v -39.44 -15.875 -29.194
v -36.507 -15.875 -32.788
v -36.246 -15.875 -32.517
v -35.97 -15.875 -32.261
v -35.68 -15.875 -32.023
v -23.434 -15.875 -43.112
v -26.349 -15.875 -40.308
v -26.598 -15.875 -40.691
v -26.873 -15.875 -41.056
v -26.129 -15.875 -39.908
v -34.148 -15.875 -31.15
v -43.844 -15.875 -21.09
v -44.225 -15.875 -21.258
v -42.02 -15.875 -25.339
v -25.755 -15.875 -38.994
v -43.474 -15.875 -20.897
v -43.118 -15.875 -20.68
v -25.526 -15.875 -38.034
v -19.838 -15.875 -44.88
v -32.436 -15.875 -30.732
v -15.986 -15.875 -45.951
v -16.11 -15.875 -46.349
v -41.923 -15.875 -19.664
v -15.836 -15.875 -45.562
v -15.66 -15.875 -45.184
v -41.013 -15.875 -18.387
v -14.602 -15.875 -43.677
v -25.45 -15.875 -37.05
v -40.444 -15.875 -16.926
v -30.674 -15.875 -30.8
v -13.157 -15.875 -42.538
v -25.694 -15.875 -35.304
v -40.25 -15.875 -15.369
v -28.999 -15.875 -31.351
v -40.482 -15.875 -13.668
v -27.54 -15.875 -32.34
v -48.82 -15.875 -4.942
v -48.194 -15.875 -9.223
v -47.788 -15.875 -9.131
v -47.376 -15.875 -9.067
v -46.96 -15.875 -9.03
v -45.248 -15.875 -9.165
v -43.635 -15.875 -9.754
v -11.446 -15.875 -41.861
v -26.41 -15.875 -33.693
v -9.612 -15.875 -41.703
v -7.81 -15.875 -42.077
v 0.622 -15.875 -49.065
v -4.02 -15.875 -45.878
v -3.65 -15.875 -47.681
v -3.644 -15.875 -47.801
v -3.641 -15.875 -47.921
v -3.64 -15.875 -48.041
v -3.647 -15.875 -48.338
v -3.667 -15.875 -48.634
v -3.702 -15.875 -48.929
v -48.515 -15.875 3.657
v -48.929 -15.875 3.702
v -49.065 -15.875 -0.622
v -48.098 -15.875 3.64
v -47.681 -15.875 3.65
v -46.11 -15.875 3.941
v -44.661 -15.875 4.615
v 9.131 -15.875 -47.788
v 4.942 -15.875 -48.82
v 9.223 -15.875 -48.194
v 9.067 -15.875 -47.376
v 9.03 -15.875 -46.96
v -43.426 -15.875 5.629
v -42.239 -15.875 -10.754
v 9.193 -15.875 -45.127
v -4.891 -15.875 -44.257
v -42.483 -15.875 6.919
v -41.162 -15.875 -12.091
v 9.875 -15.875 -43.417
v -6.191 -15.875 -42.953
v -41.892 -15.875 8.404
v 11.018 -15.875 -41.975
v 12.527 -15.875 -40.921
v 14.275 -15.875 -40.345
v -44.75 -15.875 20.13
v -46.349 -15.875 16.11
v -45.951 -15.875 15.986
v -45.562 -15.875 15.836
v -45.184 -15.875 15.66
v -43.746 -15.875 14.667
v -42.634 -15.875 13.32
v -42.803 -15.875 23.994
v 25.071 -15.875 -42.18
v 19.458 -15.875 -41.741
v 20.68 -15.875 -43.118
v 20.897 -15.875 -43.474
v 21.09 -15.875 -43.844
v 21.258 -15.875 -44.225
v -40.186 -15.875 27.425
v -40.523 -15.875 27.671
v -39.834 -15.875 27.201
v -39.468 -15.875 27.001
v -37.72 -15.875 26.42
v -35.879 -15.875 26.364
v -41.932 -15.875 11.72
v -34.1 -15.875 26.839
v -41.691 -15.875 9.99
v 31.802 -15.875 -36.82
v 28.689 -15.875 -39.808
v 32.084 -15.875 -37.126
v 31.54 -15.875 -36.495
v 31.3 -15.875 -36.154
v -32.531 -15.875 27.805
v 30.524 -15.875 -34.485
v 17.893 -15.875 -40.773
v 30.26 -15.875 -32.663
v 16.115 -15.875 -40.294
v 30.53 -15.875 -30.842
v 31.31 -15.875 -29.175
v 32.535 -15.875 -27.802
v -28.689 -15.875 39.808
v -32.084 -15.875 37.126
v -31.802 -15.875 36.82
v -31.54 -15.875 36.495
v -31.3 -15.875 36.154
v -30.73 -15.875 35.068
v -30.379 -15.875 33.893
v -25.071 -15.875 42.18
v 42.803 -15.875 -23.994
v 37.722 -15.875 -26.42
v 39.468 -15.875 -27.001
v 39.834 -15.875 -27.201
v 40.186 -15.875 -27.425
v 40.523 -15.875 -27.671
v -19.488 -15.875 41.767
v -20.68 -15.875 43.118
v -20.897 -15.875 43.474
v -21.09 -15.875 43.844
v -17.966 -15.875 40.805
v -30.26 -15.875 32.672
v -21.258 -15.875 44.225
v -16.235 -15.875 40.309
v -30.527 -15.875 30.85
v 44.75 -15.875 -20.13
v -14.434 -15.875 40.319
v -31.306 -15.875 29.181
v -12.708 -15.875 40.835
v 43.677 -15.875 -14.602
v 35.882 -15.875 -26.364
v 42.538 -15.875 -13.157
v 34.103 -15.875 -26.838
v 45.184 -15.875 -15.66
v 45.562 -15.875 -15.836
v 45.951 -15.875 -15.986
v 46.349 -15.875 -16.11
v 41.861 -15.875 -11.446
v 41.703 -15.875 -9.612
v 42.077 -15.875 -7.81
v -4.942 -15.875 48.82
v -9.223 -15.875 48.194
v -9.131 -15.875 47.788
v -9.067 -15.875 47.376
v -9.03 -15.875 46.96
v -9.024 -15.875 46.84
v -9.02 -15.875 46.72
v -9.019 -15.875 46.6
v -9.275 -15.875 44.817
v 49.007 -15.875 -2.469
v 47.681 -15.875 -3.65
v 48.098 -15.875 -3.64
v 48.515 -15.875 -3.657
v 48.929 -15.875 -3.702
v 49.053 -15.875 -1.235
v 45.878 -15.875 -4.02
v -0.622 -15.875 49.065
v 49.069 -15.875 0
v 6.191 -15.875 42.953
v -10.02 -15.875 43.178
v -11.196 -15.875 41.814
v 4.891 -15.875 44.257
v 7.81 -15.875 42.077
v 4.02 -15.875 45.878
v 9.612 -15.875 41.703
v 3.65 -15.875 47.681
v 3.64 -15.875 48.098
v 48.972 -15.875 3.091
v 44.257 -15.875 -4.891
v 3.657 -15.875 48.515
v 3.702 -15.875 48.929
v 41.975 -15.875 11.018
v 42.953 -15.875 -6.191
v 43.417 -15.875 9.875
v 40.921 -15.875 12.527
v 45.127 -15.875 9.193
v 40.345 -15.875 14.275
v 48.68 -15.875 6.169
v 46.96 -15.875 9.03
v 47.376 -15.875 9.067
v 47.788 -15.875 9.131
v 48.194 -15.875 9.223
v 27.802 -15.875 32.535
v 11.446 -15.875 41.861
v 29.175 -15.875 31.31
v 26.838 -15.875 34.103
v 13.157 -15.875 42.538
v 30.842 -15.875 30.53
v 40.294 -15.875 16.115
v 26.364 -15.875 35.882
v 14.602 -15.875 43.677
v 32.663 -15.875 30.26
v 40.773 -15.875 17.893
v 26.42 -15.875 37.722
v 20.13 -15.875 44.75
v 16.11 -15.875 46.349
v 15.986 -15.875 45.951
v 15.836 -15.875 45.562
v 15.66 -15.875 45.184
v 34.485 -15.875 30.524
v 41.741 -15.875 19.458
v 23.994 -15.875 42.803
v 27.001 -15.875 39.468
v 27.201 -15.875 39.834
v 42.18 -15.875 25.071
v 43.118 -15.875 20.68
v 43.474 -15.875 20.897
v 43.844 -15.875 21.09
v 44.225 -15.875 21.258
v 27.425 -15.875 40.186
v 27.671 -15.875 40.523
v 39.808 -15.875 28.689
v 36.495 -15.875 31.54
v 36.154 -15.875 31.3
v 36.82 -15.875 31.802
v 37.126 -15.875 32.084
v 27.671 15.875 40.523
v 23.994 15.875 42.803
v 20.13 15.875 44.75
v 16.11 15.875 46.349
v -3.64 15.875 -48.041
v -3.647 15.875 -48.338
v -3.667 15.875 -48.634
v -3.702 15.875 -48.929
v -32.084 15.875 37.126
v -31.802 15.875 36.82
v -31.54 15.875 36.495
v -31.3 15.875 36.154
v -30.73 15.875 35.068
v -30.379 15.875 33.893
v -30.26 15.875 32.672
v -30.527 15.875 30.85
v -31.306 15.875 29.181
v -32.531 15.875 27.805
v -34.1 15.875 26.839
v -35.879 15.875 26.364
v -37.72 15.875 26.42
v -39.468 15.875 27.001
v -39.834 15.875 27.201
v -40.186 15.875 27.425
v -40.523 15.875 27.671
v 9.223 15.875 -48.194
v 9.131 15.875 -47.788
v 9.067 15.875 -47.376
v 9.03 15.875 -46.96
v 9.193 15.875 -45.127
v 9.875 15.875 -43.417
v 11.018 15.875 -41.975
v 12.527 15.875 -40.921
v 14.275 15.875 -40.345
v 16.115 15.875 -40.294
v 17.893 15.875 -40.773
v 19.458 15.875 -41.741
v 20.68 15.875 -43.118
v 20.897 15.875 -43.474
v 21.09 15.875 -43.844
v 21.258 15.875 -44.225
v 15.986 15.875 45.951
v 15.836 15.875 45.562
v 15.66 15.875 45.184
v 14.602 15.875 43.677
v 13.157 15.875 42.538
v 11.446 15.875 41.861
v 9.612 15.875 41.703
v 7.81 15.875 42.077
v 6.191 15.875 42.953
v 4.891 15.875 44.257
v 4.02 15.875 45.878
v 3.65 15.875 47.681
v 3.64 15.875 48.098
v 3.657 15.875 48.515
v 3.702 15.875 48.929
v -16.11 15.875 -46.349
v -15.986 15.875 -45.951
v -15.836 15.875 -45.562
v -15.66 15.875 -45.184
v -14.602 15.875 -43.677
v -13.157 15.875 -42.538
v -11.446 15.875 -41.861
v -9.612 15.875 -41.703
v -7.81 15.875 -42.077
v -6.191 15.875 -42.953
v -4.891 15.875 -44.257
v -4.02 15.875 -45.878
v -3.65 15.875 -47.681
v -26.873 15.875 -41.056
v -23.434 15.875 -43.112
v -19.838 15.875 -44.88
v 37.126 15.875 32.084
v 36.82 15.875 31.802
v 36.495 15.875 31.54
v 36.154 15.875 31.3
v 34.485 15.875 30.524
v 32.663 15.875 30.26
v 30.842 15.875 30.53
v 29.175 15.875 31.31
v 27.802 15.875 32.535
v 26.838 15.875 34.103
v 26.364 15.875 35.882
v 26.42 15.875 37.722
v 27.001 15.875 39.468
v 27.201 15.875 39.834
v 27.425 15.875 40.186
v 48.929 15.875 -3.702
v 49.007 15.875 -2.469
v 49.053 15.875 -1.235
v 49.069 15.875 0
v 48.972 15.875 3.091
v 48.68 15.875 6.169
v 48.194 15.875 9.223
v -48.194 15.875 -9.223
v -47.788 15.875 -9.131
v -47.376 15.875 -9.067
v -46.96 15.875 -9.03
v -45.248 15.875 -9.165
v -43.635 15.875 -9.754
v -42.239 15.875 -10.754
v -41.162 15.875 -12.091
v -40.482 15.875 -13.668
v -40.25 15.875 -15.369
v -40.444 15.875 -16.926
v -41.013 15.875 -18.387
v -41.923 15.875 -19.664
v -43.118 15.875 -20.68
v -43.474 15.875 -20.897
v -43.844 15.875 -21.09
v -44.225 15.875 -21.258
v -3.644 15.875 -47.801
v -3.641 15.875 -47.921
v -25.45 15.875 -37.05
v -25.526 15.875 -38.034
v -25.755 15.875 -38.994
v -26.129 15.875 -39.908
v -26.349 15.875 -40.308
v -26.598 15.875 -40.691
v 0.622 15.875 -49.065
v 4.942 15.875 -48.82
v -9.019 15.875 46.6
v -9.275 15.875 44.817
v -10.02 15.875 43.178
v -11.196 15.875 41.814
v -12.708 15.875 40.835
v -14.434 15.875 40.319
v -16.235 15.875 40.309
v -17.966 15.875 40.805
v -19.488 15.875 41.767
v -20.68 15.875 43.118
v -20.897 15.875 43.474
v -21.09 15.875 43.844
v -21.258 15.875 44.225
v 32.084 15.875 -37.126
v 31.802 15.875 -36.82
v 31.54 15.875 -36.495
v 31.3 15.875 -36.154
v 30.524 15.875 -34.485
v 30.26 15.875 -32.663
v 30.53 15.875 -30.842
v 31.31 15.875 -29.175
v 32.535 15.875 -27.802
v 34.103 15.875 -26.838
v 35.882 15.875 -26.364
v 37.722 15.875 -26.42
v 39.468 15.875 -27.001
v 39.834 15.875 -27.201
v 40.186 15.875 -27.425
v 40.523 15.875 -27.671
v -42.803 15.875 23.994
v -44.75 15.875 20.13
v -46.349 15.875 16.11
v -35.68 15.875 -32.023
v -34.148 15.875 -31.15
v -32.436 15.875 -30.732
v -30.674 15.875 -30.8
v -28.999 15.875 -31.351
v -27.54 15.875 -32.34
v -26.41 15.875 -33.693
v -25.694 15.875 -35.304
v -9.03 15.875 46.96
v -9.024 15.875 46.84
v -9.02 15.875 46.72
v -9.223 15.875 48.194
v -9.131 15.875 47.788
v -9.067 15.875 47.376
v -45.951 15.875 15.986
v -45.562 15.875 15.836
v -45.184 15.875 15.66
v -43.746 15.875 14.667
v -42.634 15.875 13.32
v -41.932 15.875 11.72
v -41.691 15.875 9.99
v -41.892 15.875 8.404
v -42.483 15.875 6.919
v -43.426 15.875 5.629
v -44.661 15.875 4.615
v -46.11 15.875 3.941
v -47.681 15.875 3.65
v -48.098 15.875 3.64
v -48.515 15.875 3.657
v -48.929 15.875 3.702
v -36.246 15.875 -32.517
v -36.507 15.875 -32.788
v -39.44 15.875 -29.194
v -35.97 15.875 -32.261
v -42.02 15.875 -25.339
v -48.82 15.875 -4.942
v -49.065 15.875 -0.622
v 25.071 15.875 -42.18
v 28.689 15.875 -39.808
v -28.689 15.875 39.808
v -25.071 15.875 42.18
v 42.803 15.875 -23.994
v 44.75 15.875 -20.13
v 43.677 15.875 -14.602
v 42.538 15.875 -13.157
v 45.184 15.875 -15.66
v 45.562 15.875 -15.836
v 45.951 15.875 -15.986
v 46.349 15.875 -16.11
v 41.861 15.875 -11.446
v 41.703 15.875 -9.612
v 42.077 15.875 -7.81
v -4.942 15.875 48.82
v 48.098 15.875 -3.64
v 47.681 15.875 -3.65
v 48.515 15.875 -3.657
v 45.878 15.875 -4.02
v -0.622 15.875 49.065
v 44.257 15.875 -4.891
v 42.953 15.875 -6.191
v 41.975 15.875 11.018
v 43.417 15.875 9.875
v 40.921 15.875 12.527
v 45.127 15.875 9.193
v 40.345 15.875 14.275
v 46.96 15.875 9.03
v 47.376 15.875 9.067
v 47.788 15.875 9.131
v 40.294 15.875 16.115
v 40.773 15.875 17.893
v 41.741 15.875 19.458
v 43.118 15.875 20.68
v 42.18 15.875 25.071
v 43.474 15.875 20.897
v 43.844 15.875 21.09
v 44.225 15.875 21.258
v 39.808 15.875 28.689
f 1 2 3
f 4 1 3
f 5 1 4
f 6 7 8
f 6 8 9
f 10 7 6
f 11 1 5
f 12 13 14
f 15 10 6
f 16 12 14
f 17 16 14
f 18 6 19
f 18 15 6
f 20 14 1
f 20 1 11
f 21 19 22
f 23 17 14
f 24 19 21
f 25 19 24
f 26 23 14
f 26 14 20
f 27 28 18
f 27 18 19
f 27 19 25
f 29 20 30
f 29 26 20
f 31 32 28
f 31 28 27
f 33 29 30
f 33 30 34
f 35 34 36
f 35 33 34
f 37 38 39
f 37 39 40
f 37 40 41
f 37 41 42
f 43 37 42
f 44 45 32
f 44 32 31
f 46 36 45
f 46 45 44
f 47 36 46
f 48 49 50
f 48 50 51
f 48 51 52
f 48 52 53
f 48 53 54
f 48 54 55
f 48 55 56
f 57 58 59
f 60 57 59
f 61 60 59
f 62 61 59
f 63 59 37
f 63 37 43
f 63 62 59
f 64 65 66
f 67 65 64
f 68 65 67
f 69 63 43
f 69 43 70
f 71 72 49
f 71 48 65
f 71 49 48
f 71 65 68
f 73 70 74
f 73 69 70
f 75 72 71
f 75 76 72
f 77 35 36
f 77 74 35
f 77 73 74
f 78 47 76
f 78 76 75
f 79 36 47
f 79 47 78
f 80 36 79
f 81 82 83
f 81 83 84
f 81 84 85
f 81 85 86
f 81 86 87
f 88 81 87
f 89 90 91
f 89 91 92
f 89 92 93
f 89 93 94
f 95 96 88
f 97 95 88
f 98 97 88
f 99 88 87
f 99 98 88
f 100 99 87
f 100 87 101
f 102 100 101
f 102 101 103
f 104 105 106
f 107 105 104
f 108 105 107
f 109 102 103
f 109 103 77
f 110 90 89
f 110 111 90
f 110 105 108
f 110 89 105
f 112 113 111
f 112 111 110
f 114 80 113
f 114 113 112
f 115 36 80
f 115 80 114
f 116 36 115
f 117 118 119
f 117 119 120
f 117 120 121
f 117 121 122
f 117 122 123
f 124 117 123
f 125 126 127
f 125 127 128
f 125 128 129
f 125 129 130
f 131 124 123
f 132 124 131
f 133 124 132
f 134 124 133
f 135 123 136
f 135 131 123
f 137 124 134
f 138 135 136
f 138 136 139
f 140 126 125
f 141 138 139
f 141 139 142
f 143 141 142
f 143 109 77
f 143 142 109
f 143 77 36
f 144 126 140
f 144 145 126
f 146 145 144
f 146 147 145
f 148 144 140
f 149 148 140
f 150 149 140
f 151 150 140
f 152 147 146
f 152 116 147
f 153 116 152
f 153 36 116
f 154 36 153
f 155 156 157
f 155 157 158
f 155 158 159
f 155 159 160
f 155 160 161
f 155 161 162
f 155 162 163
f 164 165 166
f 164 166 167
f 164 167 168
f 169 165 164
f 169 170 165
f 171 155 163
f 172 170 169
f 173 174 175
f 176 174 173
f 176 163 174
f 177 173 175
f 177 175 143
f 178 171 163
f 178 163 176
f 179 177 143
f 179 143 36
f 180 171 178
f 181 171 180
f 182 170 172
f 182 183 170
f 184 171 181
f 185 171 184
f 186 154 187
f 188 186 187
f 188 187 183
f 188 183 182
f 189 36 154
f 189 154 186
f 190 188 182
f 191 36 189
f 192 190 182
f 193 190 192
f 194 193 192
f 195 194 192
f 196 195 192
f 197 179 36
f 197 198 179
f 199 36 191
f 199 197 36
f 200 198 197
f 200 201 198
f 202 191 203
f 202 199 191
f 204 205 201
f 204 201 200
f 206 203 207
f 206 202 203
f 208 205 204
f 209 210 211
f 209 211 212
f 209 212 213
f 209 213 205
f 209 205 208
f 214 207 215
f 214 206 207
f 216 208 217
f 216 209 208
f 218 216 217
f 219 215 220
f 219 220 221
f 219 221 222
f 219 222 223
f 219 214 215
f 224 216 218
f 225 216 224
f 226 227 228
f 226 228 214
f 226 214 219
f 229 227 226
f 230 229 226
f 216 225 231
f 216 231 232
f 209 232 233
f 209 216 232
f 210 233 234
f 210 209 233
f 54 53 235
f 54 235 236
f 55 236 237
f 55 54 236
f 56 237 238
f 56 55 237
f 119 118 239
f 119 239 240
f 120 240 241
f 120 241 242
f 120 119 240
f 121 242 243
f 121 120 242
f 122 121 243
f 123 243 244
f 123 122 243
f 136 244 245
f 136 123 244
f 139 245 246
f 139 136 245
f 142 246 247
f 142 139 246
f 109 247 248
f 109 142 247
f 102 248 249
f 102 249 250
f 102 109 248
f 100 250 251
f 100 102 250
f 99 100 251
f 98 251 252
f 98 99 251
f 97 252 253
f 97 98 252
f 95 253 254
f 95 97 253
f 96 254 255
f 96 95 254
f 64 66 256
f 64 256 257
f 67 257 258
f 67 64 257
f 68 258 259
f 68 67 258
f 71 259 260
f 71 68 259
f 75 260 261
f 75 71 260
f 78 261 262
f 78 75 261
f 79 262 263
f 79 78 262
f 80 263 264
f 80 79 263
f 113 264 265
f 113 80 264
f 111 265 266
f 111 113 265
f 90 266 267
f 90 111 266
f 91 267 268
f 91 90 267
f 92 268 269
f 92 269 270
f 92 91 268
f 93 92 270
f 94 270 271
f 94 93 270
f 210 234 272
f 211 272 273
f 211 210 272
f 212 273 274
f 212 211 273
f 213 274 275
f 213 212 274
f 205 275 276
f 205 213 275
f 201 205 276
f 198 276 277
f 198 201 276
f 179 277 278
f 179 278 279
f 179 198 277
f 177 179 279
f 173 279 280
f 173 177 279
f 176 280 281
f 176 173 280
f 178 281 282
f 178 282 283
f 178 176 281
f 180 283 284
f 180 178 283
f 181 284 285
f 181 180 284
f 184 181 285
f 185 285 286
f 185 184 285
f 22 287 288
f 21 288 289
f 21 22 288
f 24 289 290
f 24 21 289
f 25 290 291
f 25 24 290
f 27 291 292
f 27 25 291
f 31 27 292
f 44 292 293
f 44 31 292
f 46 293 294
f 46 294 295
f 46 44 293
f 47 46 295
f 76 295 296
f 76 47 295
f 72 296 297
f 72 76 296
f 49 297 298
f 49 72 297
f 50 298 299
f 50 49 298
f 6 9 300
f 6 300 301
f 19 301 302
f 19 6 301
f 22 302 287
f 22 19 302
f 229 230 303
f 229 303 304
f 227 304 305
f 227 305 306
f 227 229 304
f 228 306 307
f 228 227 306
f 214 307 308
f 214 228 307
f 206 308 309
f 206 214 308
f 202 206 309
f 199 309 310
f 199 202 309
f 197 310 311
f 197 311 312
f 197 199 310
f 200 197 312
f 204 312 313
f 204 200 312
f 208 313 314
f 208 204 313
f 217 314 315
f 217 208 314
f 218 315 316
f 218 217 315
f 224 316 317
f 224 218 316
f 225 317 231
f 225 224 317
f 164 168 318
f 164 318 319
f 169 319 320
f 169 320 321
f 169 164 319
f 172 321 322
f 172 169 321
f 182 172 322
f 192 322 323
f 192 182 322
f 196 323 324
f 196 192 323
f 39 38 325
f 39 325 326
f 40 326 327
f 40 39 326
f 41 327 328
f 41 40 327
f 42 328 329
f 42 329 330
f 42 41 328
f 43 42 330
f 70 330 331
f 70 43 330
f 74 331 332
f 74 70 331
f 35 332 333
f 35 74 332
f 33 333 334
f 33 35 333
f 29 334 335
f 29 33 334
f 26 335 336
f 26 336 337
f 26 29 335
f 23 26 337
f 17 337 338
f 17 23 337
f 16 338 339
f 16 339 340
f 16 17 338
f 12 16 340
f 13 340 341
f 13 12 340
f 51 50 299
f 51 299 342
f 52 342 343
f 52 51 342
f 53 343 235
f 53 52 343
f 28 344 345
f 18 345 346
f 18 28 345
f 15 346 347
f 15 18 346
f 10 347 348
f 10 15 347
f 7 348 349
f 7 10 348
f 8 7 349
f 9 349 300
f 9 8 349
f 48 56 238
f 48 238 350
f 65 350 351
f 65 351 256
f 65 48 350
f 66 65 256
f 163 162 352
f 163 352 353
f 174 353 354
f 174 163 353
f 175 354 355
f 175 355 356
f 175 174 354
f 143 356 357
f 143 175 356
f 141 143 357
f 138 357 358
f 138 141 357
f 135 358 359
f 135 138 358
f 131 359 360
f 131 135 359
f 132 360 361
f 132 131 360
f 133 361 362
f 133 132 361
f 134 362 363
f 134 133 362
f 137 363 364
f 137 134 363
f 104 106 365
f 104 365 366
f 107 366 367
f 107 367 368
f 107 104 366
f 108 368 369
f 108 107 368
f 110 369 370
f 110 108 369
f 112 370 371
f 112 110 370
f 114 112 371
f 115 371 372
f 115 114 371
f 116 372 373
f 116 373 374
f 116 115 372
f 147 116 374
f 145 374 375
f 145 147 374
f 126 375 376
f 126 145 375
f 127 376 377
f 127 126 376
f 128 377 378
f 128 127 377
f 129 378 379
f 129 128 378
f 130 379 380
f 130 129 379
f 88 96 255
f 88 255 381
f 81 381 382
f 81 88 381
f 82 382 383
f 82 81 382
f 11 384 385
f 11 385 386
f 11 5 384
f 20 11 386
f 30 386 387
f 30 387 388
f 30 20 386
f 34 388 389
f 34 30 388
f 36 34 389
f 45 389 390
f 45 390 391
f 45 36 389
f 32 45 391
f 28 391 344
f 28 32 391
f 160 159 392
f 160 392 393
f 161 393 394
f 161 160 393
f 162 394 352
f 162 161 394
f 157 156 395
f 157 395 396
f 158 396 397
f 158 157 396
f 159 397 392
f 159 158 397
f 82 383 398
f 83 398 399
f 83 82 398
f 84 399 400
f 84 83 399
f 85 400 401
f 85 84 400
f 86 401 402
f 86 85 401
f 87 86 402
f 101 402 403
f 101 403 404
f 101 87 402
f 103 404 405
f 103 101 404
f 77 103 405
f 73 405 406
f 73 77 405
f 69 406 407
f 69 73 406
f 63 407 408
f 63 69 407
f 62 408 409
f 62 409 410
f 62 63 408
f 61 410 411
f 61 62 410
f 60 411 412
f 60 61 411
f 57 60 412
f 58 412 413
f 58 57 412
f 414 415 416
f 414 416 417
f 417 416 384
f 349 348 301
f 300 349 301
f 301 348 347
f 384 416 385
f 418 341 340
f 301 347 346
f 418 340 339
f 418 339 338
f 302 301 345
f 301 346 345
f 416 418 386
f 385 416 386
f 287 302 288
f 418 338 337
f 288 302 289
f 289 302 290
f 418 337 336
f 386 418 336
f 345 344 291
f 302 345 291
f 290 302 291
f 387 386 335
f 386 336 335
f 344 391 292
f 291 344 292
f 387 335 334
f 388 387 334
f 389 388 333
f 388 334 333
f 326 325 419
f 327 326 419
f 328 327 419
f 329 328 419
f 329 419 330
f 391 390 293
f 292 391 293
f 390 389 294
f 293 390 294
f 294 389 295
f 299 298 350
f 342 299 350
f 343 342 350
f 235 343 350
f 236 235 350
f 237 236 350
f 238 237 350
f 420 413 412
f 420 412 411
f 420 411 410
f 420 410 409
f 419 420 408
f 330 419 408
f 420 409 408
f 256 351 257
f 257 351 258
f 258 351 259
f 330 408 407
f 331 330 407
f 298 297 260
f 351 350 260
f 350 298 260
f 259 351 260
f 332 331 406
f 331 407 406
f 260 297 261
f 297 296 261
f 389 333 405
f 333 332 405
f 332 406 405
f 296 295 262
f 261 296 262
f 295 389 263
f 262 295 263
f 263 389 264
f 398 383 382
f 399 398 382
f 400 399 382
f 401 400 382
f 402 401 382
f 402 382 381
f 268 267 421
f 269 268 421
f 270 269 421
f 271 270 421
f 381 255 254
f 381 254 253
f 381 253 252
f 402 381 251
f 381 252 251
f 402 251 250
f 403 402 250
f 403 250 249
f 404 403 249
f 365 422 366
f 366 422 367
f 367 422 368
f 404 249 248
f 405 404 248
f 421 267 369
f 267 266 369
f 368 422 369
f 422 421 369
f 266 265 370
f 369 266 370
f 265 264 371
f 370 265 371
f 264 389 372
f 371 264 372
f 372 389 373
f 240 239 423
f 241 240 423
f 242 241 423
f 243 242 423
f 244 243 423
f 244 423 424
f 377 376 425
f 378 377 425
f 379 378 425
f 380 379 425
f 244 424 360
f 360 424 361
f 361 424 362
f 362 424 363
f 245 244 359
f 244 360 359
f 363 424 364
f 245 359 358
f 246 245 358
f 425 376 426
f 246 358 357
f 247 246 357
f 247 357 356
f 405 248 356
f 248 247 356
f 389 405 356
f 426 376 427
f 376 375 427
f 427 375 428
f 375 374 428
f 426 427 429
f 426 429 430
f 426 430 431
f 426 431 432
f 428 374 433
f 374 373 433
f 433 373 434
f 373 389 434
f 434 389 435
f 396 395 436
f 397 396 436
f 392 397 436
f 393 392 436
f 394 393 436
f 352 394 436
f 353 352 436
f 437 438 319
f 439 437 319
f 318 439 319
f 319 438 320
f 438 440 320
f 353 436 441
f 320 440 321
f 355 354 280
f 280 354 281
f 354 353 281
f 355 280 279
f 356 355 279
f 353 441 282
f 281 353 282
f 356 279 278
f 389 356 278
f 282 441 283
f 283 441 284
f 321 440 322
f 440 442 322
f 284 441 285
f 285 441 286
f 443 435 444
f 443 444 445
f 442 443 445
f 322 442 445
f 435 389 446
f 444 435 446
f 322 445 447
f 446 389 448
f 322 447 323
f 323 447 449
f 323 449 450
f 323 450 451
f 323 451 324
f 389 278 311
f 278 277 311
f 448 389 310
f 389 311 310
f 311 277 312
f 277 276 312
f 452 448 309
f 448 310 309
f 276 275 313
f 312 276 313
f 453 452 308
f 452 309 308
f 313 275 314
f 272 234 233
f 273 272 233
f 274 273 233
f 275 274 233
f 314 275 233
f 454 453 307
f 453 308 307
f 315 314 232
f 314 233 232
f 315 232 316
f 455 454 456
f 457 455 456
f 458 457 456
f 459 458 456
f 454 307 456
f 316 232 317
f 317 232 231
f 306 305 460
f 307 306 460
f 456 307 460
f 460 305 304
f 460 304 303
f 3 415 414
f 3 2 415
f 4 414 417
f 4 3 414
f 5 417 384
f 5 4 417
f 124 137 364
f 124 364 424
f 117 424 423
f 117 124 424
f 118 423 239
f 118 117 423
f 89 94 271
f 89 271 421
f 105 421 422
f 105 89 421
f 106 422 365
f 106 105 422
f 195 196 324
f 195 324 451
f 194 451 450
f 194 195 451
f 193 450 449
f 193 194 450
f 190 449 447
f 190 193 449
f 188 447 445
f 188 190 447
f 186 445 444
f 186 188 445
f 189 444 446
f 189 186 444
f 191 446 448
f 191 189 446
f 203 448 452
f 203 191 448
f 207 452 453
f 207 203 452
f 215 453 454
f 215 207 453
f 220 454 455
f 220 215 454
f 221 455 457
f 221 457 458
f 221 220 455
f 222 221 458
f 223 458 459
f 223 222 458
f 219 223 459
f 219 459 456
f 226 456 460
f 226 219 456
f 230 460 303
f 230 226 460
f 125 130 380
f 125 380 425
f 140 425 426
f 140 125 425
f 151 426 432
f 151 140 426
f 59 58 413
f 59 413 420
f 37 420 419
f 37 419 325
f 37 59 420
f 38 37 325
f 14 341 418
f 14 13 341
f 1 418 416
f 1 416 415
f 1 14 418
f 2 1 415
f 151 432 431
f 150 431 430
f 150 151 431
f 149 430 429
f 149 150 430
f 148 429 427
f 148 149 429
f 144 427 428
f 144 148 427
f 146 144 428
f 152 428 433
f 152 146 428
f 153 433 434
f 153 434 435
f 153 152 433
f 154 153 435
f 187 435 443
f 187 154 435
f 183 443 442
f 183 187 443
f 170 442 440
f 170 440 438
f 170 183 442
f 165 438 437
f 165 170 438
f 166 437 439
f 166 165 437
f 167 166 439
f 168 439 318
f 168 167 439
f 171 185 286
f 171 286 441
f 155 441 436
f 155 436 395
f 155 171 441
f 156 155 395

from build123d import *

# Parameters (mm, degrees)
F1_DEPTH = 15.875


with BuildPart() as f1:
    # F0 (on Front) → F1 (new body, symmetric)
    with BuildSketch(Plane.XZ):
        with BuildLine():
            Line((-43.1179597079, -20.6795539033), (-35.6798299226, -32.0231574202))
            ThreePointArc((-35.6798299226, -32.0231574202), (-28.999387078, -31.3506516016), (-25.4497350562, -37.0498226993))
            ThreePointArc((-25.4497350562, -37.0498226993), (-25.6219242672, -38.5185479478), (-26.1291535934, -39.9076200809))
            Line((-26.1291535934, -39.9076200809), (-15.6603085893, -45.1835936364))
            ThreePointArc((-15.6603085893, -45.1835936364), (-8.6969613087, -41.8243775437), (-3.6499608348, -47.681025418))
            Line((-3.6499608348, -47.681025418), (9.0295717487, -46.960294218))
            ThreePointArc((9.0295717487, -46.960294218), (13.3803993428, -40.5694541047), (20.6795539033, -43.1179597079))
            Line((20.6795539033, -43.1179597079), (31.2999856287, -36.1540218876))
            ThreePointArc((31.2999856287, -36.1540218876), (31.872492796, -28.4439782009), (39.4679988731, -27.0014715148))
            Line((39.4679988731, -27.0014715148), (45.1835936364, -15.6603085893))
            ThreePointArc((45.1835936364, -15.6603085893), (41.8243775437, -8.6969613087), (47.681025418, -3.6499608348))
            Line((47.681025418, -3.6499608348), (46.960294218, 9.0295717487))
            ThreePointArc((46.960294218, 9.0295717487), (40.5694541047, 13.3803993428), (43.1179597079, 20.6795539033))
            Line((43.1179597079, 20.6795539033), (36.1540218876, 31.2999856287))
            ThreePointArc((36.1540218876, 31.2999856287), (28.4439782009, 31.872492796), (27.0014715148, 39.4679988731))
            Line((27.0014715148, 39.4679988731), (15.6603085893, 45.1835936364))
            ThreePointArc((15.6603085893, 45.1835936364), (8.6969613087, 41.8243775437), (3.6499608348, 47.681025418))
            Line((3.6499608348, 47.681025418), (-9.0295717487, 46.960294218))
            ThreePointArc((-9.0295717487, 46.960294218), (-9.0218969832, 46.7801840579), (-9.0193380405, 46.599928618))
            ThreePointArc((-9.0193380405, 46.599928618), (-13.5523860225, 40.5154249107), (-20.6795539033, 43.1179597079))
            Line((-20.6795539033, 43.1179597079), (-31.2999856287, 36.1540218876))
            ThreePointArc((-31.2999856287, 36.1540218876), (-30.5256977842, 34.4890049955), (-30.2602014915, 32.6720529775))
            ThreePointArc((-30.2602014915, 32.6720529775), (-33.2803751727, 27.2651354928), (-39.4679988731, 27.0014715148))
            Line((-39.4679988731, 27.0014715148), (-45.1835936364, 15.6603085893))
            ThreePointArc((-45.1835936364, 15.6603085893), (-42.6344735333, 13.3195534454), (-41.691391018, 9.9897271266))
            ThreePointArc((-41.691391018, 9.9897271266), (-43.4256125593, 5.6288683556), (-47.681025418, 3.6499608348))
            Line((-47.681025418, 3.6499608348), (-46.960294218, -9.0295717487))
            ThreePointArc((-46.960294218, -9.0295717487), (-42.2390698471, -10.7535595818), (-40.249928618, -15.3693380405))
            ThreePointArc((-40.249928618, -15.3693380405), (-41.0127556934, -18.3869527791), (-43.1179597079, -20.6795539033))
        make_face()
        with BuildLine():
            ThreePointArc((-40.5228638212, 27.6706958124), (-43.8188886794, 22.0833623778), (-46.3490638812, 16.1100644426))
            ThreePointArc((-46.3490638812, 16.1100644426), (-45.7552417742, 15.9139166606), (-45.1835936364, 15.6603085893))
            Line((-45.1835936364, 15.6603085893), (-39.4679988731, 27.0014715148))
            ThreePointArc((-39.4679988731, 27.0014715148), (-40.0119284743, 27.3100800632), (-40.5228638212, 27.6706958124))
        make_face()
        with BuildLine():
            ThreePointArc((-21.2584815971, 44.2249574245), (-26.9065895731, 41.0341971599), (-32.0844345415, 37.1262570045))
            ThreePointArc((-32.0844345415, 37.1262570045), (-31.6682434024, 36.6594769889), (-31.2999856287, 36.1540218876))
            Line((-31.2999856287, 36.1540218876), (-20.6795539033, 43.1179597079))
            ThreePointArc((-20.6795539033, 43.1179597079), (-20.9963064816, 43.6571873513), (-21.2584815971, 44.2249574245))
        make_face()
        with BuildLine():
            ThreePointArc((3.7020936033, 48.9291774094), (-2.7846915195, 48.9899519509), (-9.2228068767, 48.1944989841))
            ThreePointArc((-9.2228068767, 48.1944989841), (-9.0957647853, 47.582160063), (-9.0295717487, 46.960294218))
            Line((-9.0295717487, 46.960294218), (3.6499608348, 47.681025418))
            ThreePointArc((3.6499608348, 47.681025418), (3.6452588769, 48.3063865448), (3.7020936033, 48.9291774094))
        make_face()
        with BuildLine():
            ThreePointArc((16.1100644426, 46.3490638812), (15.9139166606, 45.7552417742), (15.6603085893, 45.1835936364))
            Line((15.6603085893, 45.1835936364), (27.0014715148, 39.4679988731))
            ThreePointArc((27.0014715148, 39.4679988731), (27.3100800632, 40.0119284743), (27.6706958124, 40.5228638212))
            ThreePointArc((27.6706958124, 40.5228638212), (22.0833623778, 43.8188886794), (16.1100644426, 46.3490638812))
        make_face()
        with BuildLine():
            Line((36.1540218876, 31.2999856287), (43.1179597079, 20.6795539033))
            ThreePointArc((43.1179597079, 20.6795539033), (43.6571873513, 20.9963064816), (44.2249574245, 21.2584815971))
            ThreePointArc((44.2249574245, 21.2584815971), (41.0341971599, 26.9065895731), (37.1262570045, 32.0844345415))
            ThreePointArc((37.1262570045, 32.0844345415), (36.6594769889, 31.6682434024), (36.1540218876, 31.2999856287))
        make_face()
        with BuildLine():
            Line((46.960294218, 9.0295717487), (47.681025418, -3.6499608348))
            ThreePointArc((47.681025418, -3.6499608348), (48.3063865448, -3.6452588769), (48.9291774094, -3.7020936033))
            ThreePointArc((48.9291774094, -3.7020936033), (49.0340558686, -1.8523671577), (49.0690319755, 0))
            ThreePointArc((49.0690319755, 0), (48.8499094713, 4.6320884771), (48.1944989841, 9.2228068767))
            ThreePointArc((48.1944989841, 9.2228068767), (47.582160063, 9.0957647853), (46.960294218, 9.0295717487))
        make_face()
        with BuildLine():
            Line((45.1835936364, -15.6603085893), (39.4679988731, -27.0014715148))
            ThreePointArc((39.4679988731, -27.0014715148), (40.0119284743, -27.3100800632), (40.5228638212, -27.6706958124))
            ThreePointArc((40.5228638212, -27.6706958124), (43.8188886794, -22.0833623778), (46.3490638812, -16.1100644426))
            ThreePointArc((46.3490638812, -16.1100644426), (45.7552417742, -15.9139166606), (45.1835936364, -15.6603085893))
        make_face()
        with BuildLine():
            Line((31.2999856287, -36.1540218876), (20.6795539033, -43.1179597079))
            ThreePointArc((20.6795539033, -43.1179597079), (20.9963064816, -43.6571873513), (21.2584815971, -44.2249574245))
            ThreePointArc((21.2584815971, -44.2249574245), (26.9065895731, -41.0341971599), (32.0844345415, -37.1262570045))
            ThreePointArc((32.0844345415, -37.1262570045), (31.6682434024, -36.6594769889), (31.2999856287, -36.1540218876))
        make_face()
        with BuildLine():
            Line((9.0295717487, -46.960294218), (-3.6499608348, -47.681025418))
            ThreePointArc((-3.6499608348, -47.681025418), (-3.6422860692, -47.8611355781), (-3.6397271266, -48.041391018))
            ThreePointArc((-3.6397271266, -48.041391018), (-3.6553379345, -48.4863781679), (-3.7020936033, -48.9291774094))
            ThreePointArc((-3.7020936033, -48.9291774094), (2.7846915195, -48.9899519509), (9.2228068767, -48.1944989841))
            ThreePointArc((9.2228068767, -48.1944989841), (9.0957647853, -47.582160063), (9.0295717487, -46.960294218))
        make_face()
        with BuildLine():
            Line((-15.6603085893, -45.1835936364), (-26.1291535934, -39.9076200809))
            ThreePointArc((-26.1291535934, -39.9076200809), (-26.47009136, -40.501981165), (-26.8730859737, -41.0561463031))
            ThreePointArc((-26.8730859737, -41.0561463031), (-21.6539037832, -44.0326963739), (-16.1100644426, -46.3490638812))
            ThreePointArc((-16.1100644426, -46.3490638812), (-15.9139166606, -45.7552417742), (-15.6603085893, -45.1835936364))
        make_face()
        with BuildLine():
            ThreePointArc((-36.5067509859, -32.7876048449), (-36.1102701648, -32.3870137736), (-35.6798299226, -32.0231574202))
            Line((-35.6798299226, -32.0231574202), (-43.1179597079, -20.6795539033))
            ThreePointArc((-43.1179597079, -20.6795539033), (-43.6571873513, -20.9963064816), (-44.2249574245, -21.2584815971))
            ThreePointArc((-44.2249574245, -21.2584815971), (-40.7753891021, -27.2972075968), (-36.5067509859, -32.7876048449))
        make_face()
        with BuildLine():
            ThreePointArc((-48.9291774094, 3.7020936033), (-48.9899519509, -2.7846915195), (-48.1944989841, -9.2228068767))
            ThreePointArc((-48.1944989841, -9.2228068767), (-47.582160063, -9.0957647853), (-46.960294218, -9.0295717487))
            Line((-46.960294218, -9.0295717487), (-47.681025418, 3.6499608348))
            ThreePointArc((-47.681025418, 3.6499608348), (-48.3063865448, 3.6452588769), (-48.9291774094, 3.7020936033))
        make_face()
    extrude(amount=F1_DEPTH, both=True)


solid = f1.part
